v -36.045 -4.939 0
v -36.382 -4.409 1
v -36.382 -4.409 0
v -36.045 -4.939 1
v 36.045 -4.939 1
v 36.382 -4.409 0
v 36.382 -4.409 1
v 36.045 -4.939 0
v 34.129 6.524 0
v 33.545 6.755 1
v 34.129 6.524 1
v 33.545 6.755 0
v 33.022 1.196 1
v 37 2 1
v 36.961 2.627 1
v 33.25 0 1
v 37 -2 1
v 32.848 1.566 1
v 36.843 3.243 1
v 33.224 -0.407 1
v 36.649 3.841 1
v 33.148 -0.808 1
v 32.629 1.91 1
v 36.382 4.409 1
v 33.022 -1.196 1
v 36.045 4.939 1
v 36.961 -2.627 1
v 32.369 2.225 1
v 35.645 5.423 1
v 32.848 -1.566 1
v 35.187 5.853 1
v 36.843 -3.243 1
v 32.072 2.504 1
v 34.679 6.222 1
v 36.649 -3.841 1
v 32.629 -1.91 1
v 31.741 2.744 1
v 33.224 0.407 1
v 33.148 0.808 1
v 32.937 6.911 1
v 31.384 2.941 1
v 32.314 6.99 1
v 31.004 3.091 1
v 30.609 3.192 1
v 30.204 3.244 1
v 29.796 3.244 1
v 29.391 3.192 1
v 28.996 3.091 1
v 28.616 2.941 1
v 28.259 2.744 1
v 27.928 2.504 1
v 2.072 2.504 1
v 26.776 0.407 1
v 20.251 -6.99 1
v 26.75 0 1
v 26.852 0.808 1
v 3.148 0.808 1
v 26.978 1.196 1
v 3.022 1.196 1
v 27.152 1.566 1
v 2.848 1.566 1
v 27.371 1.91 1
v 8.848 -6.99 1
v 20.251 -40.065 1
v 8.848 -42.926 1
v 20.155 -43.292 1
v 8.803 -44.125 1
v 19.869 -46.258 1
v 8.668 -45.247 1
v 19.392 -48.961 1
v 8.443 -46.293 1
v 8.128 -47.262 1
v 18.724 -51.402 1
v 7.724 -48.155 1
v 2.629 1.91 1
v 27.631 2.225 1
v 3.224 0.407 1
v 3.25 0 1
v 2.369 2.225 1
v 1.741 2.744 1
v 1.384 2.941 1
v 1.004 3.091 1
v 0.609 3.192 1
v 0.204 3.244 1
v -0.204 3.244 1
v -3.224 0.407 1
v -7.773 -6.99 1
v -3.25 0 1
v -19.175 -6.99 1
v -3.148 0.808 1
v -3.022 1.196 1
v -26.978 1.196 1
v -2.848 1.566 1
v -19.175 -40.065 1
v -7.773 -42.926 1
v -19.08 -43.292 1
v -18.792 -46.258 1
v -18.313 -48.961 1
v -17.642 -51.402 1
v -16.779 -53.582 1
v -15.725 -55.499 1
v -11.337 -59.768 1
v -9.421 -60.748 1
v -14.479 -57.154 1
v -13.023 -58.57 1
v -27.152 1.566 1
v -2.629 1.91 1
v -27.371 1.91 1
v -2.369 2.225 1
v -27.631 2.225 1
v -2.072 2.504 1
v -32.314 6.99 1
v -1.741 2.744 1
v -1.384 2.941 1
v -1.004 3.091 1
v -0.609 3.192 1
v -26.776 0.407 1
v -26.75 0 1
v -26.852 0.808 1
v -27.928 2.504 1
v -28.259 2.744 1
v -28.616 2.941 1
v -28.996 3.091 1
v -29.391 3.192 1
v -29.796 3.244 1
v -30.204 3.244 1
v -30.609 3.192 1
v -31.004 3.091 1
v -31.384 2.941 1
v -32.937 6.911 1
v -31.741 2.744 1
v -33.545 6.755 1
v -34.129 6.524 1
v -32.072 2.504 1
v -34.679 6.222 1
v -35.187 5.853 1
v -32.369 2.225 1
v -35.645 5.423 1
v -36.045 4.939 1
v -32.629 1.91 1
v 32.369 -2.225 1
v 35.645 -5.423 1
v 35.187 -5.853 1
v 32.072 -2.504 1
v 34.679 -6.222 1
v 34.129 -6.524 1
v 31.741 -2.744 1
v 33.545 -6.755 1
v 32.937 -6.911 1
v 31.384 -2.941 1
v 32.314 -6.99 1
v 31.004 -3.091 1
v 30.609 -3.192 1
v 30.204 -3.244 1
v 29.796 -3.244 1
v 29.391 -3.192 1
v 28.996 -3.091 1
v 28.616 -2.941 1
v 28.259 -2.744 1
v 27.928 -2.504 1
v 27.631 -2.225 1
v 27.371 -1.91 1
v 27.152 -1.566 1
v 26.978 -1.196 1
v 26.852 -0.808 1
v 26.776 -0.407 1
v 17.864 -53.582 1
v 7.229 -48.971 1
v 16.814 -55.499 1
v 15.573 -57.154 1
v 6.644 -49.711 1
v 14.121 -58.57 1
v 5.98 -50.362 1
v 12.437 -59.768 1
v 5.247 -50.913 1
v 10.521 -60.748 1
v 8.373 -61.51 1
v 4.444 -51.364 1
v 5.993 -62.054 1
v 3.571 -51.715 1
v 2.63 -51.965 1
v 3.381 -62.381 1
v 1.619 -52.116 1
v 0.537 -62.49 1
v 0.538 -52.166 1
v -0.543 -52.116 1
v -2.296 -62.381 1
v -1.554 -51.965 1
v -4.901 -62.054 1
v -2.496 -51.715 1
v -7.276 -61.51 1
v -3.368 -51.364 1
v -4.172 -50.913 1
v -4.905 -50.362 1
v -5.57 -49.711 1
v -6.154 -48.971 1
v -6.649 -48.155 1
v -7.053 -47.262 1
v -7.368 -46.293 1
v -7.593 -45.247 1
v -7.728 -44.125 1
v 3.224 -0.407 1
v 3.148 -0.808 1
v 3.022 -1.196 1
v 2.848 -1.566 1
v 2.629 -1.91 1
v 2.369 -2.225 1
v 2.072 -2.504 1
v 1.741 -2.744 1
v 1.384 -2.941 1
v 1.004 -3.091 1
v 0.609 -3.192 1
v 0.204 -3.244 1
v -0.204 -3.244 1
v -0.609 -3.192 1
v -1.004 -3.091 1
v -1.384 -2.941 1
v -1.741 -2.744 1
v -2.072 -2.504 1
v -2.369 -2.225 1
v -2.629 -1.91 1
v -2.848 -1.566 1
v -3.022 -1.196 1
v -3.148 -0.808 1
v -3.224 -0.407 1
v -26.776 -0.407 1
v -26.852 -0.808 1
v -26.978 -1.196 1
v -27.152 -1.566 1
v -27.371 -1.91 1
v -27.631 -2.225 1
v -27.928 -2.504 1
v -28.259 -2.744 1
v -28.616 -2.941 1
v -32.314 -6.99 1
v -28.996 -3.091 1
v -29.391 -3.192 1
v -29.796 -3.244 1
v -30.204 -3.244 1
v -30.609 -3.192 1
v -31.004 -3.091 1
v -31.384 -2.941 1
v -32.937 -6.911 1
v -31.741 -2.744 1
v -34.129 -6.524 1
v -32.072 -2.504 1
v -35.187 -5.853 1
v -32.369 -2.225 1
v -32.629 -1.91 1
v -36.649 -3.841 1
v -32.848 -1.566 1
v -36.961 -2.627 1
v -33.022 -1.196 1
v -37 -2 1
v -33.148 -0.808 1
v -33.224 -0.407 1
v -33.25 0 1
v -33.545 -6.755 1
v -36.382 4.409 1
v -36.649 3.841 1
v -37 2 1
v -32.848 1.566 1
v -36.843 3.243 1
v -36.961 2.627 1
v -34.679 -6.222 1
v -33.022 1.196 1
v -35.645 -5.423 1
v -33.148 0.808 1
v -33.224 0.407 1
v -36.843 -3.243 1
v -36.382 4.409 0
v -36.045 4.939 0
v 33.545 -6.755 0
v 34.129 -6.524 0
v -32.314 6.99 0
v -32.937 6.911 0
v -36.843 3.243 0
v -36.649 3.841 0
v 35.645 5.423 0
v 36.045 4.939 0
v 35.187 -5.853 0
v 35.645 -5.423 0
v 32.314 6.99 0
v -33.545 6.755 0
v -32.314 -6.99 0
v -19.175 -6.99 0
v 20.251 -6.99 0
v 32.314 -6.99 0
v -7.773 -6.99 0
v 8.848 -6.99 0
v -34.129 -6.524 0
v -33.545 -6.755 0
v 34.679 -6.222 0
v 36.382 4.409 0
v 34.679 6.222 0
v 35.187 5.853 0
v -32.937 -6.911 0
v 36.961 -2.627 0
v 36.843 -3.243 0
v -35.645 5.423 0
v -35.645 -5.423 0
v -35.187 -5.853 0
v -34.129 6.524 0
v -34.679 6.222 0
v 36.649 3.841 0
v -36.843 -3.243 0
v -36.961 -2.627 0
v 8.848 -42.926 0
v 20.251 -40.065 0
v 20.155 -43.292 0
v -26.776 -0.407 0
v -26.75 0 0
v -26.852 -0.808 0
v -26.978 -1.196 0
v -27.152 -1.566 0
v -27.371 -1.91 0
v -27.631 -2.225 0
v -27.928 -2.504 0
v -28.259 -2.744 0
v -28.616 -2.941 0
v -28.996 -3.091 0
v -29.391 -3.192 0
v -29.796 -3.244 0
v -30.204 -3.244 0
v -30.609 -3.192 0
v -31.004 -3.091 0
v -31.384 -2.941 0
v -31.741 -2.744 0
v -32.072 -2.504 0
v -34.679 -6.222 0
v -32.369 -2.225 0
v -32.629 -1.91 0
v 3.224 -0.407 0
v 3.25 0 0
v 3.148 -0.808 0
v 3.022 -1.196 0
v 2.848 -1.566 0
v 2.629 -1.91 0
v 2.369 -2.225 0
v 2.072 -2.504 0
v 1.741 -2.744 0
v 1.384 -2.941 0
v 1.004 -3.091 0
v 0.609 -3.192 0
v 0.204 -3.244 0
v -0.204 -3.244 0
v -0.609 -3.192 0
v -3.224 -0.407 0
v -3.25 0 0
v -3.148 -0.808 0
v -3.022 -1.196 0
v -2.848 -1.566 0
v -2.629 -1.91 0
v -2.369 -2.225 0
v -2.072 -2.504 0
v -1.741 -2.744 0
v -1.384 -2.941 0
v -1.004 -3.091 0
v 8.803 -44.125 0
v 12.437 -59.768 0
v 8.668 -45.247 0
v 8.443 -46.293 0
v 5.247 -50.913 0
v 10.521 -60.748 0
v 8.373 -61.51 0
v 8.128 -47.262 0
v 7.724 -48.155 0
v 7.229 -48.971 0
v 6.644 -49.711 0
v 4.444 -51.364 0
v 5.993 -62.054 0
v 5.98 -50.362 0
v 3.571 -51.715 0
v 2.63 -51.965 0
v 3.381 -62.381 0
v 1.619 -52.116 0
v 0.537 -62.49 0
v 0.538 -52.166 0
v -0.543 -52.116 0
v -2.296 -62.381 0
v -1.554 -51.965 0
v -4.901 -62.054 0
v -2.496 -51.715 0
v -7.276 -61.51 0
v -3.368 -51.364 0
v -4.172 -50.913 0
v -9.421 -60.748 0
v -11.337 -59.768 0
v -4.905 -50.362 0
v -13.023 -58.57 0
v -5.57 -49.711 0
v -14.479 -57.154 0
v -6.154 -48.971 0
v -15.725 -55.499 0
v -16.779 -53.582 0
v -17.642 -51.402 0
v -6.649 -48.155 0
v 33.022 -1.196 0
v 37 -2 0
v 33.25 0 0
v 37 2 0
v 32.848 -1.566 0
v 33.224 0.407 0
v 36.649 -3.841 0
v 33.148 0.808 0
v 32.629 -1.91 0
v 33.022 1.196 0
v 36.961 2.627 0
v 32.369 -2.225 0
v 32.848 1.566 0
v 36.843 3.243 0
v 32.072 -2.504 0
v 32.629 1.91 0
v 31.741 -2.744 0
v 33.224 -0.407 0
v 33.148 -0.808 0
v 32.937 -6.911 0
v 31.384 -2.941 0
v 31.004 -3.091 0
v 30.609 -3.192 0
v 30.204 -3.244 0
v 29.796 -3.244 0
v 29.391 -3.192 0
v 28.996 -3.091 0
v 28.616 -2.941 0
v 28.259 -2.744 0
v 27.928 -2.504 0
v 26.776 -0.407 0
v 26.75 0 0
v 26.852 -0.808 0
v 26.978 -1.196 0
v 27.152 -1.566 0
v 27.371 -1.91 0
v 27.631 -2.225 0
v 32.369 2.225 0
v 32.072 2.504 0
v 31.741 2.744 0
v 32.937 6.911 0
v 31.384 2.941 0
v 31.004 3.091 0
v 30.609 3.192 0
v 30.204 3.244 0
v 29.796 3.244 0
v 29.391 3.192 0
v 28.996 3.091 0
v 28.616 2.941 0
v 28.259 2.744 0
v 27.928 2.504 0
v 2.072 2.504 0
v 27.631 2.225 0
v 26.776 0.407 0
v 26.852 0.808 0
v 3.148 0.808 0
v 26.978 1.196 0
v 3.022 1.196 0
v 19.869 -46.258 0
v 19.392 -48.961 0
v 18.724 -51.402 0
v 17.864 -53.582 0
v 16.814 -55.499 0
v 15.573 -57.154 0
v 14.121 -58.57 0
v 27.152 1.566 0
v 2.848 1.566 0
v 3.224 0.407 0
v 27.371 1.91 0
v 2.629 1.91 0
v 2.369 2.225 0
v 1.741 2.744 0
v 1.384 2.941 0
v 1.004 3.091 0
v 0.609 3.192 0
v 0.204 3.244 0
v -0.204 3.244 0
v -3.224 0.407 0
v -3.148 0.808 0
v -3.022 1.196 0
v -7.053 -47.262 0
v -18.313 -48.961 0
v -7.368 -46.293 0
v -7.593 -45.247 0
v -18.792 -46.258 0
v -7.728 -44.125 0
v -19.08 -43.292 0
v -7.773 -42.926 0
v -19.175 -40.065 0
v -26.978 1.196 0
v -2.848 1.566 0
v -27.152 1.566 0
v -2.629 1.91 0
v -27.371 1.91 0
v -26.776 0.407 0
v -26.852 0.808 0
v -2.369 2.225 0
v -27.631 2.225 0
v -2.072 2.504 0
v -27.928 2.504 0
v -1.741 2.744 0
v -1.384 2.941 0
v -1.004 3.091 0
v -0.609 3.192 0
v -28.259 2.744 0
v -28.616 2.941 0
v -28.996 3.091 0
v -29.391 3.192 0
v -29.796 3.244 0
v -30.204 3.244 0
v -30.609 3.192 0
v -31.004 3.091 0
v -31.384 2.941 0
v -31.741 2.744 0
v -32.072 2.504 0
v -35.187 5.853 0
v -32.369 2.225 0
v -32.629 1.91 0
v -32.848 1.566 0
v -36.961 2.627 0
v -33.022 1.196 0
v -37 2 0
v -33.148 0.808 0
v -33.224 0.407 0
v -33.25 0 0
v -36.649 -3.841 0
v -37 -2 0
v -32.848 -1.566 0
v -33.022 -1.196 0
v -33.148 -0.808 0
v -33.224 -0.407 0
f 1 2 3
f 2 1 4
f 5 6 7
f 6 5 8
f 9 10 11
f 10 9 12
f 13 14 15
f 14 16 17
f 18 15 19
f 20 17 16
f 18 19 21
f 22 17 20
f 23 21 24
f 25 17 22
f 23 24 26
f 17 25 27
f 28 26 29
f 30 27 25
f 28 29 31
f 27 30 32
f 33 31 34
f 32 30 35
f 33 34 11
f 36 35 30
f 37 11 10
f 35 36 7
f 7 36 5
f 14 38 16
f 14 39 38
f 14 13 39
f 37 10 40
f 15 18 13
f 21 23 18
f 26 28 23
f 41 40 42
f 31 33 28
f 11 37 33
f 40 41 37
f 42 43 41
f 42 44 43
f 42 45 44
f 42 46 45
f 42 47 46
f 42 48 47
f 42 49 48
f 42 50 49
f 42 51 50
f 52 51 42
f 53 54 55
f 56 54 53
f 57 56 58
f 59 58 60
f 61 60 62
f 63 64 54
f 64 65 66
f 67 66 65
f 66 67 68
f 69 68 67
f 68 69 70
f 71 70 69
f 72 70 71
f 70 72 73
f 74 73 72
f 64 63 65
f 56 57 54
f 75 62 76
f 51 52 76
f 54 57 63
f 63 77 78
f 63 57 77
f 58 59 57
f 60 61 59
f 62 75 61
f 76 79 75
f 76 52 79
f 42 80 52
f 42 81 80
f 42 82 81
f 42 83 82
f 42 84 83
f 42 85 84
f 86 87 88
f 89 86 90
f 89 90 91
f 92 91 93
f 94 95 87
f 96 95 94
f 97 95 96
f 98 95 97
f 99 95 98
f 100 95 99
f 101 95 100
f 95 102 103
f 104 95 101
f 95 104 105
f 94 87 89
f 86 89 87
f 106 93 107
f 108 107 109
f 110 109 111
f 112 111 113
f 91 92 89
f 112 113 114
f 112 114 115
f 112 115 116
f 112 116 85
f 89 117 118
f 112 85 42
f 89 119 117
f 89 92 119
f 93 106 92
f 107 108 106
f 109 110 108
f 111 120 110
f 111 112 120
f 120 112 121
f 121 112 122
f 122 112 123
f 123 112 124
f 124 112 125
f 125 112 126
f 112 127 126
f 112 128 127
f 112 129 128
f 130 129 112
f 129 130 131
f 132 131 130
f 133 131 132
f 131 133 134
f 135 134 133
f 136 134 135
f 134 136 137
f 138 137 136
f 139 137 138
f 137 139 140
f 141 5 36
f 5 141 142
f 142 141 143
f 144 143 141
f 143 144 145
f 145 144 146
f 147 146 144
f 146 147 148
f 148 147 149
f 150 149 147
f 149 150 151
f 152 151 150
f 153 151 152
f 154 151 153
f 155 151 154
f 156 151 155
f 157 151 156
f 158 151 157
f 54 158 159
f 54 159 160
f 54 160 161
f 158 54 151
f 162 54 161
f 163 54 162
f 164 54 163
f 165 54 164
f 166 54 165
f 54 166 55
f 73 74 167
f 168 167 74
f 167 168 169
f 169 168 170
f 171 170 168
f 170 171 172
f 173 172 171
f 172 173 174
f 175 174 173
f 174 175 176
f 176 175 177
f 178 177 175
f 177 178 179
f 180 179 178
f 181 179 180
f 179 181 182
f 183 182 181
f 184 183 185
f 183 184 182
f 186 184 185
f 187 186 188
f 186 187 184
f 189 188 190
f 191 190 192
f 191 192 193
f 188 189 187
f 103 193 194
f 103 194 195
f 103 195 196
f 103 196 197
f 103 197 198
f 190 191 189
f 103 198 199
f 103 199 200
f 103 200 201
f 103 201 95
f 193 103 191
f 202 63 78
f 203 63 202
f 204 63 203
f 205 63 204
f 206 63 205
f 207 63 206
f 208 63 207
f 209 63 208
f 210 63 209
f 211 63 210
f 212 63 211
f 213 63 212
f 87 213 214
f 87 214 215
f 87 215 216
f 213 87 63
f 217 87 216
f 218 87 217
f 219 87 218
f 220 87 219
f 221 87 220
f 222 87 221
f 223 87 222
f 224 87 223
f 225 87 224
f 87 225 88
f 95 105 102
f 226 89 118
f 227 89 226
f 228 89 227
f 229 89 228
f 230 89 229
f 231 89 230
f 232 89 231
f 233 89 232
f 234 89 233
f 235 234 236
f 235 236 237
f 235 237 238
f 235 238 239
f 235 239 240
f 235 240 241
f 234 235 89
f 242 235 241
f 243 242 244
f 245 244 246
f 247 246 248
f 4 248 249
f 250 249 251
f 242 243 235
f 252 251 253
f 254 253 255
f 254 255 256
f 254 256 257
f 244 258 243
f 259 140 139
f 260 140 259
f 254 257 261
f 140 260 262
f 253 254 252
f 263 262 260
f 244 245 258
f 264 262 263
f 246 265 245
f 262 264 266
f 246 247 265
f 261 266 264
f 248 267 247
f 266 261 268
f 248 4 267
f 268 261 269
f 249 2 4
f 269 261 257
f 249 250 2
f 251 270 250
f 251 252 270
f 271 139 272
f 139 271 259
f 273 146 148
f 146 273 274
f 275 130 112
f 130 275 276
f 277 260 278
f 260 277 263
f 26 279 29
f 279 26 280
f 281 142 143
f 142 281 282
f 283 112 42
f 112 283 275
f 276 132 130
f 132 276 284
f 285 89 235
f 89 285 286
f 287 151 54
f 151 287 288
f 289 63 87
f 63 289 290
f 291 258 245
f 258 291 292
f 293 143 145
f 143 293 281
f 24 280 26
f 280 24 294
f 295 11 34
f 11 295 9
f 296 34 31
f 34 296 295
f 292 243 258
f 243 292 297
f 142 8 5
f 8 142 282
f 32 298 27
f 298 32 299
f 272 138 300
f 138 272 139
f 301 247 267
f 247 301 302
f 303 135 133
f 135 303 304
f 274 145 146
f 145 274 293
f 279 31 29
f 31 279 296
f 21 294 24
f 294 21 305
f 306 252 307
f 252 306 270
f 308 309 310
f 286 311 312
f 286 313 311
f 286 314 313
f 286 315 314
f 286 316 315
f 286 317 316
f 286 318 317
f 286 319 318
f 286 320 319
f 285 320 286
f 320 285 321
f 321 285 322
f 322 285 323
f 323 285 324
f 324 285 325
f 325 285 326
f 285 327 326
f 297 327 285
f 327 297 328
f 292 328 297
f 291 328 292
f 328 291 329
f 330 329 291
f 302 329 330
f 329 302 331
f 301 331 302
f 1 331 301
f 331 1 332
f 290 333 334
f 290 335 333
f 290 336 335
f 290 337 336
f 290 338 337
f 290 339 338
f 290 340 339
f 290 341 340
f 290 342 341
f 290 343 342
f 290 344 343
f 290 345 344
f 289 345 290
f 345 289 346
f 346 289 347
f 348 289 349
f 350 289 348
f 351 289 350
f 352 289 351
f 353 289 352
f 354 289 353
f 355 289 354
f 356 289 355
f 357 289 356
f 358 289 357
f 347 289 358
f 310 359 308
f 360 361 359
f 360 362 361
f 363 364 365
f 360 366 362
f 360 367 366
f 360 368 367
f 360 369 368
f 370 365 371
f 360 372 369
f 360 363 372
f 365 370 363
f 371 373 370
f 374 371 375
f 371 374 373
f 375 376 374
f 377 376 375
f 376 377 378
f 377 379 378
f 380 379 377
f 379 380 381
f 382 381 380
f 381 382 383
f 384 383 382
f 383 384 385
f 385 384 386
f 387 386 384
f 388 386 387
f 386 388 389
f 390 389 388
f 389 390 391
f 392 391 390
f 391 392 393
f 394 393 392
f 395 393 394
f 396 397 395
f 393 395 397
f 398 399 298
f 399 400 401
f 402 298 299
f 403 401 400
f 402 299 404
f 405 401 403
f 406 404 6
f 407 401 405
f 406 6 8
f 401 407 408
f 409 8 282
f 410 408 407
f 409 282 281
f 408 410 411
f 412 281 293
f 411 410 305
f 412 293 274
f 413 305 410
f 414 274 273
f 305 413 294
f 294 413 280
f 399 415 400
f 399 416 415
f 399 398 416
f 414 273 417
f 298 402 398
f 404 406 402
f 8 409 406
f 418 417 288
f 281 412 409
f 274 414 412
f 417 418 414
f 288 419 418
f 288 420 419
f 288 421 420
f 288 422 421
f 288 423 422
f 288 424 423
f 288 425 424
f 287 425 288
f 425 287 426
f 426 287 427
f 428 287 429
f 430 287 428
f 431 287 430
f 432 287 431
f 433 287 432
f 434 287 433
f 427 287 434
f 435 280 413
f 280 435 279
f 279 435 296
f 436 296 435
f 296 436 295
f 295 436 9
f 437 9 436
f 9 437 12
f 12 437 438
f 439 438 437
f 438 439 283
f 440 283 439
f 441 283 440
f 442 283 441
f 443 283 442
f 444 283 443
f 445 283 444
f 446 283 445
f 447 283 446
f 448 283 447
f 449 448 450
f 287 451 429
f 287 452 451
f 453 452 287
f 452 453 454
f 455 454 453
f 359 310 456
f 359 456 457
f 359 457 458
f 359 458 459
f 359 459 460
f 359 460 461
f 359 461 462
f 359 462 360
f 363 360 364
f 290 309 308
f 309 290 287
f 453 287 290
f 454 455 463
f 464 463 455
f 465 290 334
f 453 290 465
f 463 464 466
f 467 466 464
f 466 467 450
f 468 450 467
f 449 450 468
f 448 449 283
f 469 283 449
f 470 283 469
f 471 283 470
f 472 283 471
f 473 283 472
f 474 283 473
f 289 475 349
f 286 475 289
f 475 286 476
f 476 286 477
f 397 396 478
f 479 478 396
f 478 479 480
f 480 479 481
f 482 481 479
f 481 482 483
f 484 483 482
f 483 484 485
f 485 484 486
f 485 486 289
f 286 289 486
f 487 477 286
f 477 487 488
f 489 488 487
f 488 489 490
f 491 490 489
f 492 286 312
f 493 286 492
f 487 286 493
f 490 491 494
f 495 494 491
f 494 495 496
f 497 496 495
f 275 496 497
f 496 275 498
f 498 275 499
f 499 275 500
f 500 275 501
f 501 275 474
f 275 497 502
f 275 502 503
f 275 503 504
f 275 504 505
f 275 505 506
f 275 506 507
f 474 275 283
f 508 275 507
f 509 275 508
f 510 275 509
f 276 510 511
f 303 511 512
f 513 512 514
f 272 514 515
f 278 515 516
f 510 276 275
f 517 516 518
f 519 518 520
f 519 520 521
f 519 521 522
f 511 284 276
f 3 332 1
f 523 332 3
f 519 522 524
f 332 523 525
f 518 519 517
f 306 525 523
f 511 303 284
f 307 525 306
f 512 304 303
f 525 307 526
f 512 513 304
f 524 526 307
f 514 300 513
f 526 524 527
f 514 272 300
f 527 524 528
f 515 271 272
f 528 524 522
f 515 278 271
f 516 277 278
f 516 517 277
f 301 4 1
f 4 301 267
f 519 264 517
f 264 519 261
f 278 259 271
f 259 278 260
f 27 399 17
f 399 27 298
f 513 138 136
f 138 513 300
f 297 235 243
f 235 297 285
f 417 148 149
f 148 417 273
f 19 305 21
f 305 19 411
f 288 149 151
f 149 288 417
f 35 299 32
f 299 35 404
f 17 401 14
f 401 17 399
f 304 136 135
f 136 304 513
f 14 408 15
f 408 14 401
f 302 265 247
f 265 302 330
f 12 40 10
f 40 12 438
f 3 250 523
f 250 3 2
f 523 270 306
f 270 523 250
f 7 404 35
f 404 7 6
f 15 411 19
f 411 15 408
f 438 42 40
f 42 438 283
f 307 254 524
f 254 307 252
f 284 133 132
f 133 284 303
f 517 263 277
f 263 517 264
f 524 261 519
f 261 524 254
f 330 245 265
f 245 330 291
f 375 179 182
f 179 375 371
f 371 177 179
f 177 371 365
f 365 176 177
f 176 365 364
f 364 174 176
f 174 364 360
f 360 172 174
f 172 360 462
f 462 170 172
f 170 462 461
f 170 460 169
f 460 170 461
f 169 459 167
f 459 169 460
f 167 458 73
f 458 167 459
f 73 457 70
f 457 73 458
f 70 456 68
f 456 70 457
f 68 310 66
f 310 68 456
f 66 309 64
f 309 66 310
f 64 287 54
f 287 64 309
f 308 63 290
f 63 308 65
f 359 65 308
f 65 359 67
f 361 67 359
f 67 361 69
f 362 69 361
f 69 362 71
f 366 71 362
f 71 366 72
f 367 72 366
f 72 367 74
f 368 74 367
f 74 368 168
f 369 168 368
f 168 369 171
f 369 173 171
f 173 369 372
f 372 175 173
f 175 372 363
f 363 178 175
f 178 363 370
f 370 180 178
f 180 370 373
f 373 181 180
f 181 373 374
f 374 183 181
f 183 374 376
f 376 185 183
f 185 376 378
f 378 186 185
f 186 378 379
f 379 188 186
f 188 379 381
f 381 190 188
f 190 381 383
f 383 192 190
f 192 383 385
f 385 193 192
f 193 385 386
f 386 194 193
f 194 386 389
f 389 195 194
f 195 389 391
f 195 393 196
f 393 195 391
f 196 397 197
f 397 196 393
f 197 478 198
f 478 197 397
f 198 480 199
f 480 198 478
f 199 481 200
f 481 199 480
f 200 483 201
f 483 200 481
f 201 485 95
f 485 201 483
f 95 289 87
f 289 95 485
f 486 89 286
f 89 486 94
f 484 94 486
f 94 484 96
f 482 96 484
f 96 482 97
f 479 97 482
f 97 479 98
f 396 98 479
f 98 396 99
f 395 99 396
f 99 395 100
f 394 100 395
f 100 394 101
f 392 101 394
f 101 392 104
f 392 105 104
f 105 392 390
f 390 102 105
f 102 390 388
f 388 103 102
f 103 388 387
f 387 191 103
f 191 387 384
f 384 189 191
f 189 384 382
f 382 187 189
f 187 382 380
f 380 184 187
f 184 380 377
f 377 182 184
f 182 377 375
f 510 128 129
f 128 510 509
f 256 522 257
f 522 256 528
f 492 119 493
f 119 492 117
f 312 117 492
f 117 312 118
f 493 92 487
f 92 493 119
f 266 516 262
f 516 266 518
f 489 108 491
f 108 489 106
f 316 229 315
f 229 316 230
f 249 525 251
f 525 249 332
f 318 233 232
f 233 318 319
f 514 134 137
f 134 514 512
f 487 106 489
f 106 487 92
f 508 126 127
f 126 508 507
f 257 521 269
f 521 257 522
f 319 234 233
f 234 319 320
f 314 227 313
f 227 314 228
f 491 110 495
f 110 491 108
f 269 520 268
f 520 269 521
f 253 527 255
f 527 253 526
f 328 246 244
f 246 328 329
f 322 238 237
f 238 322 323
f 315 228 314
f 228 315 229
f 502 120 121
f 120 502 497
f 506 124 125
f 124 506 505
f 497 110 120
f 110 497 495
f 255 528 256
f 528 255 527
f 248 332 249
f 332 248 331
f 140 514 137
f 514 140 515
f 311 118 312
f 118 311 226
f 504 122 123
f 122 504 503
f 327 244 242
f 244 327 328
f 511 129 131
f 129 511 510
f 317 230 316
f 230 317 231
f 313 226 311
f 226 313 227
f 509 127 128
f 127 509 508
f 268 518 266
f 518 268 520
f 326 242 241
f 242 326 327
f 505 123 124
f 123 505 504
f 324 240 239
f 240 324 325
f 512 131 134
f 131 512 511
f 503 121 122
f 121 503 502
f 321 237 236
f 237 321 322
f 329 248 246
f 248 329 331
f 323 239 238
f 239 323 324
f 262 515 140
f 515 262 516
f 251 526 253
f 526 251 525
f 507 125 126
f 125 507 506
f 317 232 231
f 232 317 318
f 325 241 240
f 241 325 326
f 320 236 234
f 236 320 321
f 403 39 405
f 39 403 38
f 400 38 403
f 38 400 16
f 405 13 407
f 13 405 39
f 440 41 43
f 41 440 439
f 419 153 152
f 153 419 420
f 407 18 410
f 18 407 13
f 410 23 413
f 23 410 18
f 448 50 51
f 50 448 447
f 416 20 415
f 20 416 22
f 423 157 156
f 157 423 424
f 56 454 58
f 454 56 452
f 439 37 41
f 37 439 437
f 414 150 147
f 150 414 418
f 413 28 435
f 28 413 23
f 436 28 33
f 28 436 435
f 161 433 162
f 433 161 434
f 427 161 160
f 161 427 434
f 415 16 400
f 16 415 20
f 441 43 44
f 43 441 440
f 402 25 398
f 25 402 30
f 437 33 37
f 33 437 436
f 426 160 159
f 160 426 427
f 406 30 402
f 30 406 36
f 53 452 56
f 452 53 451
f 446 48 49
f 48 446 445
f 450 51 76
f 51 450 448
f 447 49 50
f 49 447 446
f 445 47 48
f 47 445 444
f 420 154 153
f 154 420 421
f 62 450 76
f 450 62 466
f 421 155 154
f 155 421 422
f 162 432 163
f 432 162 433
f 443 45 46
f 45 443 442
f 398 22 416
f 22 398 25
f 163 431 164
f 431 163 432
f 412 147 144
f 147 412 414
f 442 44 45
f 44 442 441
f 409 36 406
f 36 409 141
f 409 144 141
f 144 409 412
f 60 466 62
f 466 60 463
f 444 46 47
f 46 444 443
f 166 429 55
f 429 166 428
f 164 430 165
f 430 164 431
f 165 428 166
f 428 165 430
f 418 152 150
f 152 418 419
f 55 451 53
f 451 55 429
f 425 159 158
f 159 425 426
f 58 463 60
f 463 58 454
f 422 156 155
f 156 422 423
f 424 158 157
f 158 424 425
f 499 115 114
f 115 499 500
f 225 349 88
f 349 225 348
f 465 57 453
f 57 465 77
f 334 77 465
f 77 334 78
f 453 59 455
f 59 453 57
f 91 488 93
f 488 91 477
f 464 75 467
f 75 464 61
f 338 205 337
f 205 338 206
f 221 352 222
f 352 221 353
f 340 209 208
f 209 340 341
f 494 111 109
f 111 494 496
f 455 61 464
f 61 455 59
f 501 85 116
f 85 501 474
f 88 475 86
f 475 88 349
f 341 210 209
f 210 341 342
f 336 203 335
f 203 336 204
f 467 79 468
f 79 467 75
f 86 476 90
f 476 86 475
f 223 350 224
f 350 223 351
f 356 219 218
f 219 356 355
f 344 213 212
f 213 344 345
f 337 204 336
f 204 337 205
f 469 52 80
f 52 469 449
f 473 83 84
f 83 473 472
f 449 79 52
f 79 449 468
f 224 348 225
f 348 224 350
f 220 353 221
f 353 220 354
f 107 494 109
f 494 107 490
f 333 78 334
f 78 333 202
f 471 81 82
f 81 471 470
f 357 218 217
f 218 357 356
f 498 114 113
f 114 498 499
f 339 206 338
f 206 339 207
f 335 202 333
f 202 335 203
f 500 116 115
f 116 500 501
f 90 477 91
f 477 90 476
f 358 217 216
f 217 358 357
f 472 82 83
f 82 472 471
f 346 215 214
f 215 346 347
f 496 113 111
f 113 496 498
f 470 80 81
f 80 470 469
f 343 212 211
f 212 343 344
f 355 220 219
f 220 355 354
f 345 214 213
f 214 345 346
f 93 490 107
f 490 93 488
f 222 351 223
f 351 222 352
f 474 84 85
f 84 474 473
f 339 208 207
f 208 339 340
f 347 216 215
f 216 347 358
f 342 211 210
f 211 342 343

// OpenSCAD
$fn = 50;


difference() {
	union() {
		translate(v = [0, 0, 0]) {
			rotate(a = [0, 0, 0]) {
				hull() {
					translate(v = [-32.0000000000, 2.0000000000, 0]) {
						rotate(a = [0, 0, 0]) {
							translate(v = [0, 0, 0]) {
								rotate(a = [0, 0, 0]) {
									cylinder(h = 1, r = 5);
								}
							}
						}
					}
					translate(v = [32.0000000000, 2.0000000000, 0]) {
						rotate(a = [0, 0, 0]) {
							translate(v = [0, 0, 0]) {
								rotate(a = [0, 0, 0]) {
									cylinder(h = 1, r = 5);
								}
							}
						}
					}
					translate(v = [-32.0000000000, -2.0000000000, 0]) {
						rotate(a = [0, 0, 0]) {
							translate(v = [0, 0, 0]) {
								rotate(a = [0, 0, 0]) {
									cylinder(h = 1, r = 5);
								}
							}
						}
					}
					translate(v = [32.0000000000, -2.0000000000, 0]) {
						rotate(a = [0, 0, 0]) {
							translate(v = [0, 0, 0]) {
								rotate(a = [0, 0, 0]) {
									cylinder(h = 1, r = 5);
								}
							}
						}
					}
				}
			}
		}
		translate(v = [0, -5, 0]) {
			rotate(a = [0, 0, 0]) {
				linear_extrude(height = 1) {
					text(font = "DejaVu Sans Mono:style=Bold", halign = "center", size = 57.0000000000, text = "U", valign = "top");
				}
			}
		}
	}
	union() {
		translate(v = [-30.0000000000, 0.0000000000, -125.0000000000]) {
			rotate(a = [0, 0, 0]) {
				cylinder(h = 250, r = 3.2500000000);
			}
		}
		translate(v = [30.0000000000, 0.0000000000, -125.0000000000]) {
			rotate(a = [0, 0, 0]) {
				cylinder(h = 250, r = 3.2500000000);
			}
		}
		translate(v = [30.0000000000, 0.0000000000, -125.0000000000]) {
			rotate(a = [0, 0, 0]) {
				cylinder(h = 250, r = 3.2500000000);
			}
		}
		translate(v = [0, 0, -125.0000000000]) {
			rotate(a = [0, 0, 0]) {
				cylinder(h = 250, r = 3.2500000000);
			}
		}
	}
}
